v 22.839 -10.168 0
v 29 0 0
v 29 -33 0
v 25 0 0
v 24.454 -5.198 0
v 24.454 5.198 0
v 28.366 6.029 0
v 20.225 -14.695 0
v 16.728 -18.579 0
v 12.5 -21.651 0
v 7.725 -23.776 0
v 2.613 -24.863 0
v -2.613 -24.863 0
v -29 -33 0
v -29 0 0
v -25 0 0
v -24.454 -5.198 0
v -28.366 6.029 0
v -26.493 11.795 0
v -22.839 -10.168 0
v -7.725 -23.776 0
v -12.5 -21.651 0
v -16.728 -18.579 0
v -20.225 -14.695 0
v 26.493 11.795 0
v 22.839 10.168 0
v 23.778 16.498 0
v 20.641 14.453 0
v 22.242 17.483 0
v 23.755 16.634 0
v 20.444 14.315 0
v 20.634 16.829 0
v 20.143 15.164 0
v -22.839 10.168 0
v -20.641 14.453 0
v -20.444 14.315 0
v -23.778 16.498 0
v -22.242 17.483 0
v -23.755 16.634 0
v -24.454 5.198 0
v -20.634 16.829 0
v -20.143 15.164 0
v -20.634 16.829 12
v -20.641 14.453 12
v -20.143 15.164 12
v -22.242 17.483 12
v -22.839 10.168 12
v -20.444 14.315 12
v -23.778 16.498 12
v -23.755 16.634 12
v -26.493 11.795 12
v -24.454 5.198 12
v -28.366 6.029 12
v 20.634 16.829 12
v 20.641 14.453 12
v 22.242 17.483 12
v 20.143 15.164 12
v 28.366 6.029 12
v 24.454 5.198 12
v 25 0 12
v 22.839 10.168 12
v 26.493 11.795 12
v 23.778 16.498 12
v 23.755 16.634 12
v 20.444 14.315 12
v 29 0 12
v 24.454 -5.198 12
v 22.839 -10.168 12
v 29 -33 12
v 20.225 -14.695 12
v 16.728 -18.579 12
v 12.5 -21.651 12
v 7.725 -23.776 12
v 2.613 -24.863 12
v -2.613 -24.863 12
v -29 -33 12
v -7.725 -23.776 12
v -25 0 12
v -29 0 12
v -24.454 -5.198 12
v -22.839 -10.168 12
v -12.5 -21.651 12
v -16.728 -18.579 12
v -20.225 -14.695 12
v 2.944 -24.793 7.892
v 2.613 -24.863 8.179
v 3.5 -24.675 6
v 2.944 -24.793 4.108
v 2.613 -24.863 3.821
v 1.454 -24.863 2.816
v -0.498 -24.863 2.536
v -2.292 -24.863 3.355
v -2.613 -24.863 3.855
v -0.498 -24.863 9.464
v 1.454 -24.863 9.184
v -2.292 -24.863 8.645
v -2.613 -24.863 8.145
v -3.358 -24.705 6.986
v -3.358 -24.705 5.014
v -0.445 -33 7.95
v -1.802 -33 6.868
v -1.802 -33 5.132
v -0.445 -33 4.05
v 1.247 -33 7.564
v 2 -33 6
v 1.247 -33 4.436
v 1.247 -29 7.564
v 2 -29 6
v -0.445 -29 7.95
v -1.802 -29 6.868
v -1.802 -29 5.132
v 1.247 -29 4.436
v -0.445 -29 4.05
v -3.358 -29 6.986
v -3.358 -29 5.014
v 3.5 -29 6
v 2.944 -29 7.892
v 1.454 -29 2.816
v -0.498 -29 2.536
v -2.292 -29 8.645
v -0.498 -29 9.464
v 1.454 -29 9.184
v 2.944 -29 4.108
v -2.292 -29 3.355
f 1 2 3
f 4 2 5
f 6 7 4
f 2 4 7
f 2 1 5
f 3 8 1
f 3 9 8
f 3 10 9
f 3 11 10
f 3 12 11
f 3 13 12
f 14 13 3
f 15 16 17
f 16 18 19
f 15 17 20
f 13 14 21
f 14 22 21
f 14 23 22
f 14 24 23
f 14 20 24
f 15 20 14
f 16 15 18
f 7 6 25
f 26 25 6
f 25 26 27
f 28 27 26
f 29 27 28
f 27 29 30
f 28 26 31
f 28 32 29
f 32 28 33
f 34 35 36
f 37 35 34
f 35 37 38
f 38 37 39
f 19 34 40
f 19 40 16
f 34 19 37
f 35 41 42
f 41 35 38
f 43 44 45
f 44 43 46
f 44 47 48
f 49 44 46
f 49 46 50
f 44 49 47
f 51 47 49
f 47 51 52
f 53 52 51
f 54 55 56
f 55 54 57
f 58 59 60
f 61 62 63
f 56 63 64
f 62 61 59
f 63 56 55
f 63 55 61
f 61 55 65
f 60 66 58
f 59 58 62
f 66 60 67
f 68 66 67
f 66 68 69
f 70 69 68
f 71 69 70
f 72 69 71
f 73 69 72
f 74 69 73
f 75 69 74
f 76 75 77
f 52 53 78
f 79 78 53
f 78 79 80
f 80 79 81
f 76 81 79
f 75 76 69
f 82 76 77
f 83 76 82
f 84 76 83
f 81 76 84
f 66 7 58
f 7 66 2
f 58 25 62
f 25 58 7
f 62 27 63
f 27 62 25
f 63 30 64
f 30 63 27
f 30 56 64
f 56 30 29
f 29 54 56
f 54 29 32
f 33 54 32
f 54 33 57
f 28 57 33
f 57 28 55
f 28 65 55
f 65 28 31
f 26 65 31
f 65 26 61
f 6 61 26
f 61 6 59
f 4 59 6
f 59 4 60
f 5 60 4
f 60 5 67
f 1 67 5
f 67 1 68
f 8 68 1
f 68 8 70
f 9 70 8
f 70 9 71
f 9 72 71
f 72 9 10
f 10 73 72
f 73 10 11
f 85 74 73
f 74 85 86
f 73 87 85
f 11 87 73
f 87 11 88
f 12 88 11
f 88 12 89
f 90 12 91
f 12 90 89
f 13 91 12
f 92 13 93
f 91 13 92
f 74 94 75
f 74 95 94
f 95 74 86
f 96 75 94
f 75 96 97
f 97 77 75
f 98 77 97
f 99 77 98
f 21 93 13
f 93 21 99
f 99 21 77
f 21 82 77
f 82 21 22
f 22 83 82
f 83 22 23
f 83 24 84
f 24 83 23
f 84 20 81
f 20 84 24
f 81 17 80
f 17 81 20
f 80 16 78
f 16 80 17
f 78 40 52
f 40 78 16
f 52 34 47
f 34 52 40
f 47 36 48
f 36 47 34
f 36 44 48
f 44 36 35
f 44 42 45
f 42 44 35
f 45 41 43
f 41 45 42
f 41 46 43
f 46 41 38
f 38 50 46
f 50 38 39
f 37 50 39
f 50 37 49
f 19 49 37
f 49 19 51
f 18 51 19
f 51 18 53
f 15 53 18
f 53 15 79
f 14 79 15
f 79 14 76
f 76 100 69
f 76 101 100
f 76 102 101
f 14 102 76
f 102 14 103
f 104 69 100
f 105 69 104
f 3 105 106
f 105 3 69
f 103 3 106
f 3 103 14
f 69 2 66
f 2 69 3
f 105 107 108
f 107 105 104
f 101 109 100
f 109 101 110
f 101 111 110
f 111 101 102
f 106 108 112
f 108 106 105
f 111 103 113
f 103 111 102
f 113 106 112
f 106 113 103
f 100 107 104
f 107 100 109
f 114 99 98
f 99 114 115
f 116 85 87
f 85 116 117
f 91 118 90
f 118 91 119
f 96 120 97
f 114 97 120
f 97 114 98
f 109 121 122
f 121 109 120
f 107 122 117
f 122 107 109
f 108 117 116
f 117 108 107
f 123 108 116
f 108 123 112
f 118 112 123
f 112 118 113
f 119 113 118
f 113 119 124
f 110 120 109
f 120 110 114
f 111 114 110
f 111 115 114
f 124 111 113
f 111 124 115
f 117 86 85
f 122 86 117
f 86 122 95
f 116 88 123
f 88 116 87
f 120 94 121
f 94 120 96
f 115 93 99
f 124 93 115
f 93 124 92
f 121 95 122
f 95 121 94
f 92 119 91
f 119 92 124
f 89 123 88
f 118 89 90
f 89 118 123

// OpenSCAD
// click & clamp

pipe_diameter=50;
pipe_radius=pipe_diameter/2;

clamp_thickness=4;

clamp_radius=pipe_radius+clamp_thickness;

screw_diameter=4;
screw_radius=screw_diameter/2;

screw_head_diameter=7;
screw_head_radius=screw_head_diameter/2;


clamp_height=12;
opening_angle=110;

difference(){
	linear_extrude(height=clamp_height){
		difference(){
			union(){
				translate([-clamp_radius,-clamp_radius-clamp_thickness,0])
					square([2*clamp_radius,clamp_radius+clamp_thickness]);
				circle(r=clamp_radius);
			}
			circle(r=pipe_radius);
			polygon(points=[	[0,0],
								[clamp_radius*cos((180-opening_angle)/2),clamp_radius*sin((180-opening_angle)/2)],
								[clamp_radius*cos((180-opening_angle)/2),clamp_radius],
								[clamp_radius*cos(90+opening_angle/2),clamp_radius],
								[clamp_radius*cos(90+opening_angle/2),clamp_radius*sin(90+opening_angle/2)]],
					path=[0,1,2,3,4]);
		}
		rotate([0,0,(180-opening_angle)/2]) translate([pipe_radius+1/2*clamp_thickness,0,0]) circle(r=clamp_thickness/2);
		rotate([0,0,90+opening_angle/2]) translate([pipe_radius+1/2*clamp_thickness,0,0]) circle(r=clamp_thickness/2);
	}
translate([0,0,clamp_height/2]) rotate([90,0,0]) cylinder(r=screw_radius,h=clamp_radius*2);
translate([0,0,clamp_height/2]) rotate([90,0,0]) cylinder(r=screw_head_radius,h=clamp_radius);
}
